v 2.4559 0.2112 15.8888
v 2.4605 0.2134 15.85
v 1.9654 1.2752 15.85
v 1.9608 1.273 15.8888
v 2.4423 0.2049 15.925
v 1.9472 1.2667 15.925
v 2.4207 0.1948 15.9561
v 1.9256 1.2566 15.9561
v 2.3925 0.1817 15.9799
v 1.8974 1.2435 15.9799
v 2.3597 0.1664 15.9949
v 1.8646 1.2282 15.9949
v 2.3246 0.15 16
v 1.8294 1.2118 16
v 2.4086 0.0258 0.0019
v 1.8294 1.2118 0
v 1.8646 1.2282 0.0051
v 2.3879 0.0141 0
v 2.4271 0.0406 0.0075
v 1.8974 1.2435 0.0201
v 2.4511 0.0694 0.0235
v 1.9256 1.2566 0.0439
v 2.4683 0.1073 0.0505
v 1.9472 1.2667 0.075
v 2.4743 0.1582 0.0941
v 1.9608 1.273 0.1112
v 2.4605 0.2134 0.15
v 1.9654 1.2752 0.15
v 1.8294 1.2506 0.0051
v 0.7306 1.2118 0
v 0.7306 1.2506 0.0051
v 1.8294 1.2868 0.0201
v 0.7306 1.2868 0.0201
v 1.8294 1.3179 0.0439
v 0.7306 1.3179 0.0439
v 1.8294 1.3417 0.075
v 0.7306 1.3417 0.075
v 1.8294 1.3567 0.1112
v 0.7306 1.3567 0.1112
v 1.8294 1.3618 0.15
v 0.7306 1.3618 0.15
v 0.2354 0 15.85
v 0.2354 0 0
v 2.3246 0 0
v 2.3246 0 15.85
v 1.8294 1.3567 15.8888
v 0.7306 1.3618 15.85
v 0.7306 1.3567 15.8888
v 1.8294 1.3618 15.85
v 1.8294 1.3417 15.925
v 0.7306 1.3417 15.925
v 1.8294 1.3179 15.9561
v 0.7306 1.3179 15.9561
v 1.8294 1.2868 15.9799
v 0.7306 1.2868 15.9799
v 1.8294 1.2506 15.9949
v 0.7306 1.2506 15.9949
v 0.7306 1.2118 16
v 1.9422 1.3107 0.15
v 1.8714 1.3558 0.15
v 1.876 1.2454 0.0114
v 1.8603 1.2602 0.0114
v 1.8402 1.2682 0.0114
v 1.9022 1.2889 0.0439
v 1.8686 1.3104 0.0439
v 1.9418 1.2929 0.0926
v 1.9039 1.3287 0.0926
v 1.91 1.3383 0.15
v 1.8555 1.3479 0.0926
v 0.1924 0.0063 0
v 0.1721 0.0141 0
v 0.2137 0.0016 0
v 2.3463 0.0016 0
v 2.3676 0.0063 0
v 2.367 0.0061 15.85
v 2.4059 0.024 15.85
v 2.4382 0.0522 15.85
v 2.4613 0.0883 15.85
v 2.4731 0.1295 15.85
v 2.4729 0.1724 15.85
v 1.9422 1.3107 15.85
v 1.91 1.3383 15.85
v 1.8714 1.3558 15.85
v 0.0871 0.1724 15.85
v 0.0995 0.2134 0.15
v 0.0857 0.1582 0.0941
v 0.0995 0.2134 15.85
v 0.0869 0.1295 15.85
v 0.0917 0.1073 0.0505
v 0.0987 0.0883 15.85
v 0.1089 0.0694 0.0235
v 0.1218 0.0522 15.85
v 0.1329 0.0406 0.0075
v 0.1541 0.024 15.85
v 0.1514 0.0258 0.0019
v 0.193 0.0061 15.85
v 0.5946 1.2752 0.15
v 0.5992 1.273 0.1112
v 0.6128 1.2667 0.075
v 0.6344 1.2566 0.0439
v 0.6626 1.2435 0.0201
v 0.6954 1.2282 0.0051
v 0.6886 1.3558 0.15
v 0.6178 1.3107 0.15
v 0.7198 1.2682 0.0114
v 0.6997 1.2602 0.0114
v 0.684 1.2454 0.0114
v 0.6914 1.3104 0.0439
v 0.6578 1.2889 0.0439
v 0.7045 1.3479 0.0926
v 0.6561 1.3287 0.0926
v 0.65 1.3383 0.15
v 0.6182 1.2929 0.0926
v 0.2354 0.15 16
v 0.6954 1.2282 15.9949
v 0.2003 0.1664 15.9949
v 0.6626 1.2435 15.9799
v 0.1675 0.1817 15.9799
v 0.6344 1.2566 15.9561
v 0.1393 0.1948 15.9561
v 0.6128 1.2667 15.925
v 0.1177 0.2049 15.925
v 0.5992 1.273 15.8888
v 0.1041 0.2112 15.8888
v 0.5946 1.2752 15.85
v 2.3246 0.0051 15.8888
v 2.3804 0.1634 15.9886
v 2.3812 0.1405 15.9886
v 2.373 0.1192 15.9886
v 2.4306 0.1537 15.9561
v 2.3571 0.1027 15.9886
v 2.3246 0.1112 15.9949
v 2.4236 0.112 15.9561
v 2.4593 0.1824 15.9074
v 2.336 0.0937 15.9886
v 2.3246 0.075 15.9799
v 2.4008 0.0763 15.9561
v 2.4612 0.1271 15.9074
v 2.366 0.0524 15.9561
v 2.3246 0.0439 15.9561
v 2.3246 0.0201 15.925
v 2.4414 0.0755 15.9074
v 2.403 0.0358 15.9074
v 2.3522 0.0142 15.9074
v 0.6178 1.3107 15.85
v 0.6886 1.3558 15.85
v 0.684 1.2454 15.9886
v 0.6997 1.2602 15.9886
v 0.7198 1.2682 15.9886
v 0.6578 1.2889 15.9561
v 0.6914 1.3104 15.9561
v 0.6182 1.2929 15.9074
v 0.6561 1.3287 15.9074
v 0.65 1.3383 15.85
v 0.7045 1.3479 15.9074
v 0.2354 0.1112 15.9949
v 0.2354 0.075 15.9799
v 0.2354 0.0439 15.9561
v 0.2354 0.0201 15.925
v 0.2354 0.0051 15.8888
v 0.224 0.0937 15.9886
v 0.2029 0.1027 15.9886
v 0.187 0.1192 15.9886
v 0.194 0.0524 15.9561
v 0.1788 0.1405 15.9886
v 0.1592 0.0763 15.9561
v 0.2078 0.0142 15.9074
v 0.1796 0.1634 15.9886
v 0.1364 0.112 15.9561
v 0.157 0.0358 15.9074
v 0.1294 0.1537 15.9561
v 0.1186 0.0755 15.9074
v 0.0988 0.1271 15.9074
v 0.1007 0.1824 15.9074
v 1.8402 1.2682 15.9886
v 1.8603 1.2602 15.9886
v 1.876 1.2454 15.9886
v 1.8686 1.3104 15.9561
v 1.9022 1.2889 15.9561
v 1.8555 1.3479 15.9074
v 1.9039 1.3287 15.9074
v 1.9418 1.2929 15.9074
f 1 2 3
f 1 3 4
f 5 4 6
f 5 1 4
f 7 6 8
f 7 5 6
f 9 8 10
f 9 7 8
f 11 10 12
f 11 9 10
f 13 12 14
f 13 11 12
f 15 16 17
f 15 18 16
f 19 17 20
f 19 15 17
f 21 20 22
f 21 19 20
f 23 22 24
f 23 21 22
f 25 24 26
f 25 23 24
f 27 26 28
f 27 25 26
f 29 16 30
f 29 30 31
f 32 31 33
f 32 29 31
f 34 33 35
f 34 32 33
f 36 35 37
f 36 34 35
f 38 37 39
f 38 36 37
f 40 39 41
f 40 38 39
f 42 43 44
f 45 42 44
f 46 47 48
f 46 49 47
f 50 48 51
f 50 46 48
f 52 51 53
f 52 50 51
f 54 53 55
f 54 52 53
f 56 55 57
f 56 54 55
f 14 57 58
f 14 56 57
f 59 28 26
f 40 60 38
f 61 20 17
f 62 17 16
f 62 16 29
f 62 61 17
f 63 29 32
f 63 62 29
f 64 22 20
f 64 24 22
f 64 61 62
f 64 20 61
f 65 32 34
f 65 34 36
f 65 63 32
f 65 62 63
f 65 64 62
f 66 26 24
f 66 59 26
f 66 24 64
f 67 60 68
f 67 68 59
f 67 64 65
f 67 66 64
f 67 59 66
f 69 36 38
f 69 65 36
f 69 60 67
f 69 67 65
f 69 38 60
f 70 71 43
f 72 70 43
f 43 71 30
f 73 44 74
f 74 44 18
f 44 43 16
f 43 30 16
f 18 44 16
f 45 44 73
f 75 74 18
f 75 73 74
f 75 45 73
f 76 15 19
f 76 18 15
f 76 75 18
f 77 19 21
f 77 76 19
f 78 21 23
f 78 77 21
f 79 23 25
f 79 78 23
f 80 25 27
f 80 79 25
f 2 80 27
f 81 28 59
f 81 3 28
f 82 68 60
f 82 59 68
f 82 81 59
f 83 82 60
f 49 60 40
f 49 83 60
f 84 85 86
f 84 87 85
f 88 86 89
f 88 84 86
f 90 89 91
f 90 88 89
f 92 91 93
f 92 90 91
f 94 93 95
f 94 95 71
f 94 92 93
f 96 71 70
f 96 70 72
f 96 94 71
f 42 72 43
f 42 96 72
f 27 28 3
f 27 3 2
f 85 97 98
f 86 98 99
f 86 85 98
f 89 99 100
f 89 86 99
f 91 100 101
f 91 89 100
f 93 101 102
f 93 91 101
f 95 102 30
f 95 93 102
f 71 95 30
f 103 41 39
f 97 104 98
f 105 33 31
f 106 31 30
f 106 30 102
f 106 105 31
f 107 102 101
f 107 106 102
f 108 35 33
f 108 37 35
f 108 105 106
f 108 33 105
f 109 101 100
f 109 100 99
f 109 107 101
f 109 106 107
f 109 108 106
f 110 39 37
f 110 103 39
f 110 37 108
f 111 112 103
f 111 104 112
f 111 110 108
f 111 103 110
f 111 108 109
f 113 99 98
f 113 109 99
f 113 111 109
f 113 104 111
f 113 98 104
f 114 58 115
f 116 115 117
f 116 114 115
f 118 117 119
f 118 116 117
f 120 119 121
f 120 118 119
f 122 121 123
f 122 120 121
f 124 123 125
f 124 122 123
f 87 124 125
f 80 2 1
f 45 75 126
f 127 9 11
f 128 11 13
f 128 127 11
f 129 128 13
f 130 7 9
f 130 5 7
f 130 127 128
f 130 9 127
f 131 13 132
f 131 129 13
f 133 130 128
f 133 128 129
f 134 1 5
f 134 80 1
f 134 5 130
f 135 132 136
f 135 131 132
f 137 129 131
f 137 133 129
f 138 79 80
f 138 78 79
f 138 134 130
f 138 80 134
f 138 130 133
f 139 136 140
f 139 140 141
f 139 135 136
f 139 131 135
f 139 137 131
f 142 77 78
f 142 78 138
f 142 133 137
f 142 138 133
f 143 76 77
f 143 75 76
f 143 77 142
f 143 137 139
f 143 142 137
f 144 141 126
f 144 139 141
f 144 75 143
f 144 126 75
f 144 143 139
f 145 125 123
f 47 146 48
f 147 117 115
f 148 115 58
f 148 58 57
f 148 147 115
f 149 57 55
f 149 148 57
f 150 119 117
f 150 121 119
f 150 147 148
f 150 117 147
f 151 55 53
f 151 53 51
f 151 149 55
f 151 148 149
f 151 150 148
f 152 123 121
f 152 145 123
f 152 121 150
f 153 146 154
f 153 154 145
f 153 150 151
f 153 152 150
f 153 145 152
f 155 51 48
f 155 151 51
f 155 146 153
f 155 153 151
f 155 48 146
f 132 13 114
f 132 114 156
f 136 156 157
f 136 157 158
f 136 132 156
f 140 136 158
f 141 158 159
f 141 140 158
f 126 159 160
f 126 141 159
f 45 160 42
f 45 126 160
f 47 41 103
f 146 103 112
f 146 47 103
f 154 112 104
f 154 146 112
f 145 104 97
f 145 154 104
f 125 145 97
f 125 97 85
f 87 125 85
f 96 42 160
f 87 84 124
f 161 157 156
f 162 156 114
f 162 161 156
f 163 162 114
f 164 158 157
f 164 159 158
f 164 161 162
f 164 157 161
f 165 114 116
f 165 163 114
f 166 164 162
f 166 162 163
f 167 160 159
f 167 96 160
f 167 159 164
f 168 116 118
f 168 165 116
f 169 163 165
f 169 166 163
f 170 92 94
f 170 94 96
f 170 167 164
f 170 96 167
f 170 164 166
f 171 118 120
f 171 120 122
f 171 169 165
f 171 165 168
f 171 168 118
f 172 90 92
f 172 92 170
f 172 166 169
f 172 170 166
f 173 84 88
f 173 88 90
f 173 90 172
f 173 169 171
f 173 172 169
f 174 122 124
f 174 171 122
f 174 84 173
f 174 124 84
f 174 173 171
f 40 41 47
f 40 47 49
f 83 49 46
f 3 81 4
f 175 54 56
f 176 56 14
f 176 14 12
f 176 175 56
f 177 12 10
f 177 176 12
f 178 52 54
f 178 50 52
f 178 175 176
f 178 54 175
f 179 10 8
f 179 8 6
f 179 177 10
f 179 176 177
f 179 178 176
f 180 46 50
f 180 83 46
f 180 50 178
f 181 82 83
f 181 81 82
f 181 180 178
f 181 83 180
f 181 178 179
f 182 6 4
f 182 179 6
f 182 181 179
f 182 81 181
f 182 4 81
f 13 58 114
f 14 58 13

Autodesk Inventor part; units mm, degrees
ref_plane "YZ Plane" through (0, 0, 0) normal (1, 0, 0) x (0, 1, 0)
ref_plane "XZ Plane" through (0, 0, 0) normal (0, 1, 0) x (-1, 0, 0)
ref_plane "XY Plane" through (0, 0, 0) normal (0, 0, 1) x (1, 0, 0)
sketch "Sketch1" plane through (0, 0, 0) normal (0, 0, 1) x (1, 0, 0)
  line L0 (0, 0) -> (2.56, 0)
  line L1 (2.56, 0) -> (2.56, 1.3618)
  line L2 (1.28, 0) -> (1.28, 4.701) construction
  line L3 (1.925, 1.3618) -> (2.56, 0)
  line L4 (0.635, 1.3618) -> (0, 0) construction
  line L5 (0.635, 1.3618) -> (1.925, 1.3618) construction
  line L6 (1.925, 1.3618) -> (2.56, 0) construction
  line L7 (0.635, 1.3618) -> (1.925, 1.3618)
  line L8 (0.635, 1.3618) -> (0, 0)
  dimension "d0" = 2.56
  dimension "d1" = 50
  dimension "d2" = 1.29
extrude "Extrusion1" add sketch "Sketch1" along normal blind 16
fillet "Fillet1" radius 0.15 11 edges at (0.635, 1.3618, 8) (1.925, 1.3618, 8) (1.28, 1.3618, 16) (1.28, 1.3618, 0) (1.28, 0, 16) (2.56, 0, 8) (0, 0, 8) (0.3175, 0.6809, 16) (2.2425, 0.6809, 16) (0.3175, 0.6809, 0) (2.2425, 0.6809, 0)
properties part number "Tooth1"
